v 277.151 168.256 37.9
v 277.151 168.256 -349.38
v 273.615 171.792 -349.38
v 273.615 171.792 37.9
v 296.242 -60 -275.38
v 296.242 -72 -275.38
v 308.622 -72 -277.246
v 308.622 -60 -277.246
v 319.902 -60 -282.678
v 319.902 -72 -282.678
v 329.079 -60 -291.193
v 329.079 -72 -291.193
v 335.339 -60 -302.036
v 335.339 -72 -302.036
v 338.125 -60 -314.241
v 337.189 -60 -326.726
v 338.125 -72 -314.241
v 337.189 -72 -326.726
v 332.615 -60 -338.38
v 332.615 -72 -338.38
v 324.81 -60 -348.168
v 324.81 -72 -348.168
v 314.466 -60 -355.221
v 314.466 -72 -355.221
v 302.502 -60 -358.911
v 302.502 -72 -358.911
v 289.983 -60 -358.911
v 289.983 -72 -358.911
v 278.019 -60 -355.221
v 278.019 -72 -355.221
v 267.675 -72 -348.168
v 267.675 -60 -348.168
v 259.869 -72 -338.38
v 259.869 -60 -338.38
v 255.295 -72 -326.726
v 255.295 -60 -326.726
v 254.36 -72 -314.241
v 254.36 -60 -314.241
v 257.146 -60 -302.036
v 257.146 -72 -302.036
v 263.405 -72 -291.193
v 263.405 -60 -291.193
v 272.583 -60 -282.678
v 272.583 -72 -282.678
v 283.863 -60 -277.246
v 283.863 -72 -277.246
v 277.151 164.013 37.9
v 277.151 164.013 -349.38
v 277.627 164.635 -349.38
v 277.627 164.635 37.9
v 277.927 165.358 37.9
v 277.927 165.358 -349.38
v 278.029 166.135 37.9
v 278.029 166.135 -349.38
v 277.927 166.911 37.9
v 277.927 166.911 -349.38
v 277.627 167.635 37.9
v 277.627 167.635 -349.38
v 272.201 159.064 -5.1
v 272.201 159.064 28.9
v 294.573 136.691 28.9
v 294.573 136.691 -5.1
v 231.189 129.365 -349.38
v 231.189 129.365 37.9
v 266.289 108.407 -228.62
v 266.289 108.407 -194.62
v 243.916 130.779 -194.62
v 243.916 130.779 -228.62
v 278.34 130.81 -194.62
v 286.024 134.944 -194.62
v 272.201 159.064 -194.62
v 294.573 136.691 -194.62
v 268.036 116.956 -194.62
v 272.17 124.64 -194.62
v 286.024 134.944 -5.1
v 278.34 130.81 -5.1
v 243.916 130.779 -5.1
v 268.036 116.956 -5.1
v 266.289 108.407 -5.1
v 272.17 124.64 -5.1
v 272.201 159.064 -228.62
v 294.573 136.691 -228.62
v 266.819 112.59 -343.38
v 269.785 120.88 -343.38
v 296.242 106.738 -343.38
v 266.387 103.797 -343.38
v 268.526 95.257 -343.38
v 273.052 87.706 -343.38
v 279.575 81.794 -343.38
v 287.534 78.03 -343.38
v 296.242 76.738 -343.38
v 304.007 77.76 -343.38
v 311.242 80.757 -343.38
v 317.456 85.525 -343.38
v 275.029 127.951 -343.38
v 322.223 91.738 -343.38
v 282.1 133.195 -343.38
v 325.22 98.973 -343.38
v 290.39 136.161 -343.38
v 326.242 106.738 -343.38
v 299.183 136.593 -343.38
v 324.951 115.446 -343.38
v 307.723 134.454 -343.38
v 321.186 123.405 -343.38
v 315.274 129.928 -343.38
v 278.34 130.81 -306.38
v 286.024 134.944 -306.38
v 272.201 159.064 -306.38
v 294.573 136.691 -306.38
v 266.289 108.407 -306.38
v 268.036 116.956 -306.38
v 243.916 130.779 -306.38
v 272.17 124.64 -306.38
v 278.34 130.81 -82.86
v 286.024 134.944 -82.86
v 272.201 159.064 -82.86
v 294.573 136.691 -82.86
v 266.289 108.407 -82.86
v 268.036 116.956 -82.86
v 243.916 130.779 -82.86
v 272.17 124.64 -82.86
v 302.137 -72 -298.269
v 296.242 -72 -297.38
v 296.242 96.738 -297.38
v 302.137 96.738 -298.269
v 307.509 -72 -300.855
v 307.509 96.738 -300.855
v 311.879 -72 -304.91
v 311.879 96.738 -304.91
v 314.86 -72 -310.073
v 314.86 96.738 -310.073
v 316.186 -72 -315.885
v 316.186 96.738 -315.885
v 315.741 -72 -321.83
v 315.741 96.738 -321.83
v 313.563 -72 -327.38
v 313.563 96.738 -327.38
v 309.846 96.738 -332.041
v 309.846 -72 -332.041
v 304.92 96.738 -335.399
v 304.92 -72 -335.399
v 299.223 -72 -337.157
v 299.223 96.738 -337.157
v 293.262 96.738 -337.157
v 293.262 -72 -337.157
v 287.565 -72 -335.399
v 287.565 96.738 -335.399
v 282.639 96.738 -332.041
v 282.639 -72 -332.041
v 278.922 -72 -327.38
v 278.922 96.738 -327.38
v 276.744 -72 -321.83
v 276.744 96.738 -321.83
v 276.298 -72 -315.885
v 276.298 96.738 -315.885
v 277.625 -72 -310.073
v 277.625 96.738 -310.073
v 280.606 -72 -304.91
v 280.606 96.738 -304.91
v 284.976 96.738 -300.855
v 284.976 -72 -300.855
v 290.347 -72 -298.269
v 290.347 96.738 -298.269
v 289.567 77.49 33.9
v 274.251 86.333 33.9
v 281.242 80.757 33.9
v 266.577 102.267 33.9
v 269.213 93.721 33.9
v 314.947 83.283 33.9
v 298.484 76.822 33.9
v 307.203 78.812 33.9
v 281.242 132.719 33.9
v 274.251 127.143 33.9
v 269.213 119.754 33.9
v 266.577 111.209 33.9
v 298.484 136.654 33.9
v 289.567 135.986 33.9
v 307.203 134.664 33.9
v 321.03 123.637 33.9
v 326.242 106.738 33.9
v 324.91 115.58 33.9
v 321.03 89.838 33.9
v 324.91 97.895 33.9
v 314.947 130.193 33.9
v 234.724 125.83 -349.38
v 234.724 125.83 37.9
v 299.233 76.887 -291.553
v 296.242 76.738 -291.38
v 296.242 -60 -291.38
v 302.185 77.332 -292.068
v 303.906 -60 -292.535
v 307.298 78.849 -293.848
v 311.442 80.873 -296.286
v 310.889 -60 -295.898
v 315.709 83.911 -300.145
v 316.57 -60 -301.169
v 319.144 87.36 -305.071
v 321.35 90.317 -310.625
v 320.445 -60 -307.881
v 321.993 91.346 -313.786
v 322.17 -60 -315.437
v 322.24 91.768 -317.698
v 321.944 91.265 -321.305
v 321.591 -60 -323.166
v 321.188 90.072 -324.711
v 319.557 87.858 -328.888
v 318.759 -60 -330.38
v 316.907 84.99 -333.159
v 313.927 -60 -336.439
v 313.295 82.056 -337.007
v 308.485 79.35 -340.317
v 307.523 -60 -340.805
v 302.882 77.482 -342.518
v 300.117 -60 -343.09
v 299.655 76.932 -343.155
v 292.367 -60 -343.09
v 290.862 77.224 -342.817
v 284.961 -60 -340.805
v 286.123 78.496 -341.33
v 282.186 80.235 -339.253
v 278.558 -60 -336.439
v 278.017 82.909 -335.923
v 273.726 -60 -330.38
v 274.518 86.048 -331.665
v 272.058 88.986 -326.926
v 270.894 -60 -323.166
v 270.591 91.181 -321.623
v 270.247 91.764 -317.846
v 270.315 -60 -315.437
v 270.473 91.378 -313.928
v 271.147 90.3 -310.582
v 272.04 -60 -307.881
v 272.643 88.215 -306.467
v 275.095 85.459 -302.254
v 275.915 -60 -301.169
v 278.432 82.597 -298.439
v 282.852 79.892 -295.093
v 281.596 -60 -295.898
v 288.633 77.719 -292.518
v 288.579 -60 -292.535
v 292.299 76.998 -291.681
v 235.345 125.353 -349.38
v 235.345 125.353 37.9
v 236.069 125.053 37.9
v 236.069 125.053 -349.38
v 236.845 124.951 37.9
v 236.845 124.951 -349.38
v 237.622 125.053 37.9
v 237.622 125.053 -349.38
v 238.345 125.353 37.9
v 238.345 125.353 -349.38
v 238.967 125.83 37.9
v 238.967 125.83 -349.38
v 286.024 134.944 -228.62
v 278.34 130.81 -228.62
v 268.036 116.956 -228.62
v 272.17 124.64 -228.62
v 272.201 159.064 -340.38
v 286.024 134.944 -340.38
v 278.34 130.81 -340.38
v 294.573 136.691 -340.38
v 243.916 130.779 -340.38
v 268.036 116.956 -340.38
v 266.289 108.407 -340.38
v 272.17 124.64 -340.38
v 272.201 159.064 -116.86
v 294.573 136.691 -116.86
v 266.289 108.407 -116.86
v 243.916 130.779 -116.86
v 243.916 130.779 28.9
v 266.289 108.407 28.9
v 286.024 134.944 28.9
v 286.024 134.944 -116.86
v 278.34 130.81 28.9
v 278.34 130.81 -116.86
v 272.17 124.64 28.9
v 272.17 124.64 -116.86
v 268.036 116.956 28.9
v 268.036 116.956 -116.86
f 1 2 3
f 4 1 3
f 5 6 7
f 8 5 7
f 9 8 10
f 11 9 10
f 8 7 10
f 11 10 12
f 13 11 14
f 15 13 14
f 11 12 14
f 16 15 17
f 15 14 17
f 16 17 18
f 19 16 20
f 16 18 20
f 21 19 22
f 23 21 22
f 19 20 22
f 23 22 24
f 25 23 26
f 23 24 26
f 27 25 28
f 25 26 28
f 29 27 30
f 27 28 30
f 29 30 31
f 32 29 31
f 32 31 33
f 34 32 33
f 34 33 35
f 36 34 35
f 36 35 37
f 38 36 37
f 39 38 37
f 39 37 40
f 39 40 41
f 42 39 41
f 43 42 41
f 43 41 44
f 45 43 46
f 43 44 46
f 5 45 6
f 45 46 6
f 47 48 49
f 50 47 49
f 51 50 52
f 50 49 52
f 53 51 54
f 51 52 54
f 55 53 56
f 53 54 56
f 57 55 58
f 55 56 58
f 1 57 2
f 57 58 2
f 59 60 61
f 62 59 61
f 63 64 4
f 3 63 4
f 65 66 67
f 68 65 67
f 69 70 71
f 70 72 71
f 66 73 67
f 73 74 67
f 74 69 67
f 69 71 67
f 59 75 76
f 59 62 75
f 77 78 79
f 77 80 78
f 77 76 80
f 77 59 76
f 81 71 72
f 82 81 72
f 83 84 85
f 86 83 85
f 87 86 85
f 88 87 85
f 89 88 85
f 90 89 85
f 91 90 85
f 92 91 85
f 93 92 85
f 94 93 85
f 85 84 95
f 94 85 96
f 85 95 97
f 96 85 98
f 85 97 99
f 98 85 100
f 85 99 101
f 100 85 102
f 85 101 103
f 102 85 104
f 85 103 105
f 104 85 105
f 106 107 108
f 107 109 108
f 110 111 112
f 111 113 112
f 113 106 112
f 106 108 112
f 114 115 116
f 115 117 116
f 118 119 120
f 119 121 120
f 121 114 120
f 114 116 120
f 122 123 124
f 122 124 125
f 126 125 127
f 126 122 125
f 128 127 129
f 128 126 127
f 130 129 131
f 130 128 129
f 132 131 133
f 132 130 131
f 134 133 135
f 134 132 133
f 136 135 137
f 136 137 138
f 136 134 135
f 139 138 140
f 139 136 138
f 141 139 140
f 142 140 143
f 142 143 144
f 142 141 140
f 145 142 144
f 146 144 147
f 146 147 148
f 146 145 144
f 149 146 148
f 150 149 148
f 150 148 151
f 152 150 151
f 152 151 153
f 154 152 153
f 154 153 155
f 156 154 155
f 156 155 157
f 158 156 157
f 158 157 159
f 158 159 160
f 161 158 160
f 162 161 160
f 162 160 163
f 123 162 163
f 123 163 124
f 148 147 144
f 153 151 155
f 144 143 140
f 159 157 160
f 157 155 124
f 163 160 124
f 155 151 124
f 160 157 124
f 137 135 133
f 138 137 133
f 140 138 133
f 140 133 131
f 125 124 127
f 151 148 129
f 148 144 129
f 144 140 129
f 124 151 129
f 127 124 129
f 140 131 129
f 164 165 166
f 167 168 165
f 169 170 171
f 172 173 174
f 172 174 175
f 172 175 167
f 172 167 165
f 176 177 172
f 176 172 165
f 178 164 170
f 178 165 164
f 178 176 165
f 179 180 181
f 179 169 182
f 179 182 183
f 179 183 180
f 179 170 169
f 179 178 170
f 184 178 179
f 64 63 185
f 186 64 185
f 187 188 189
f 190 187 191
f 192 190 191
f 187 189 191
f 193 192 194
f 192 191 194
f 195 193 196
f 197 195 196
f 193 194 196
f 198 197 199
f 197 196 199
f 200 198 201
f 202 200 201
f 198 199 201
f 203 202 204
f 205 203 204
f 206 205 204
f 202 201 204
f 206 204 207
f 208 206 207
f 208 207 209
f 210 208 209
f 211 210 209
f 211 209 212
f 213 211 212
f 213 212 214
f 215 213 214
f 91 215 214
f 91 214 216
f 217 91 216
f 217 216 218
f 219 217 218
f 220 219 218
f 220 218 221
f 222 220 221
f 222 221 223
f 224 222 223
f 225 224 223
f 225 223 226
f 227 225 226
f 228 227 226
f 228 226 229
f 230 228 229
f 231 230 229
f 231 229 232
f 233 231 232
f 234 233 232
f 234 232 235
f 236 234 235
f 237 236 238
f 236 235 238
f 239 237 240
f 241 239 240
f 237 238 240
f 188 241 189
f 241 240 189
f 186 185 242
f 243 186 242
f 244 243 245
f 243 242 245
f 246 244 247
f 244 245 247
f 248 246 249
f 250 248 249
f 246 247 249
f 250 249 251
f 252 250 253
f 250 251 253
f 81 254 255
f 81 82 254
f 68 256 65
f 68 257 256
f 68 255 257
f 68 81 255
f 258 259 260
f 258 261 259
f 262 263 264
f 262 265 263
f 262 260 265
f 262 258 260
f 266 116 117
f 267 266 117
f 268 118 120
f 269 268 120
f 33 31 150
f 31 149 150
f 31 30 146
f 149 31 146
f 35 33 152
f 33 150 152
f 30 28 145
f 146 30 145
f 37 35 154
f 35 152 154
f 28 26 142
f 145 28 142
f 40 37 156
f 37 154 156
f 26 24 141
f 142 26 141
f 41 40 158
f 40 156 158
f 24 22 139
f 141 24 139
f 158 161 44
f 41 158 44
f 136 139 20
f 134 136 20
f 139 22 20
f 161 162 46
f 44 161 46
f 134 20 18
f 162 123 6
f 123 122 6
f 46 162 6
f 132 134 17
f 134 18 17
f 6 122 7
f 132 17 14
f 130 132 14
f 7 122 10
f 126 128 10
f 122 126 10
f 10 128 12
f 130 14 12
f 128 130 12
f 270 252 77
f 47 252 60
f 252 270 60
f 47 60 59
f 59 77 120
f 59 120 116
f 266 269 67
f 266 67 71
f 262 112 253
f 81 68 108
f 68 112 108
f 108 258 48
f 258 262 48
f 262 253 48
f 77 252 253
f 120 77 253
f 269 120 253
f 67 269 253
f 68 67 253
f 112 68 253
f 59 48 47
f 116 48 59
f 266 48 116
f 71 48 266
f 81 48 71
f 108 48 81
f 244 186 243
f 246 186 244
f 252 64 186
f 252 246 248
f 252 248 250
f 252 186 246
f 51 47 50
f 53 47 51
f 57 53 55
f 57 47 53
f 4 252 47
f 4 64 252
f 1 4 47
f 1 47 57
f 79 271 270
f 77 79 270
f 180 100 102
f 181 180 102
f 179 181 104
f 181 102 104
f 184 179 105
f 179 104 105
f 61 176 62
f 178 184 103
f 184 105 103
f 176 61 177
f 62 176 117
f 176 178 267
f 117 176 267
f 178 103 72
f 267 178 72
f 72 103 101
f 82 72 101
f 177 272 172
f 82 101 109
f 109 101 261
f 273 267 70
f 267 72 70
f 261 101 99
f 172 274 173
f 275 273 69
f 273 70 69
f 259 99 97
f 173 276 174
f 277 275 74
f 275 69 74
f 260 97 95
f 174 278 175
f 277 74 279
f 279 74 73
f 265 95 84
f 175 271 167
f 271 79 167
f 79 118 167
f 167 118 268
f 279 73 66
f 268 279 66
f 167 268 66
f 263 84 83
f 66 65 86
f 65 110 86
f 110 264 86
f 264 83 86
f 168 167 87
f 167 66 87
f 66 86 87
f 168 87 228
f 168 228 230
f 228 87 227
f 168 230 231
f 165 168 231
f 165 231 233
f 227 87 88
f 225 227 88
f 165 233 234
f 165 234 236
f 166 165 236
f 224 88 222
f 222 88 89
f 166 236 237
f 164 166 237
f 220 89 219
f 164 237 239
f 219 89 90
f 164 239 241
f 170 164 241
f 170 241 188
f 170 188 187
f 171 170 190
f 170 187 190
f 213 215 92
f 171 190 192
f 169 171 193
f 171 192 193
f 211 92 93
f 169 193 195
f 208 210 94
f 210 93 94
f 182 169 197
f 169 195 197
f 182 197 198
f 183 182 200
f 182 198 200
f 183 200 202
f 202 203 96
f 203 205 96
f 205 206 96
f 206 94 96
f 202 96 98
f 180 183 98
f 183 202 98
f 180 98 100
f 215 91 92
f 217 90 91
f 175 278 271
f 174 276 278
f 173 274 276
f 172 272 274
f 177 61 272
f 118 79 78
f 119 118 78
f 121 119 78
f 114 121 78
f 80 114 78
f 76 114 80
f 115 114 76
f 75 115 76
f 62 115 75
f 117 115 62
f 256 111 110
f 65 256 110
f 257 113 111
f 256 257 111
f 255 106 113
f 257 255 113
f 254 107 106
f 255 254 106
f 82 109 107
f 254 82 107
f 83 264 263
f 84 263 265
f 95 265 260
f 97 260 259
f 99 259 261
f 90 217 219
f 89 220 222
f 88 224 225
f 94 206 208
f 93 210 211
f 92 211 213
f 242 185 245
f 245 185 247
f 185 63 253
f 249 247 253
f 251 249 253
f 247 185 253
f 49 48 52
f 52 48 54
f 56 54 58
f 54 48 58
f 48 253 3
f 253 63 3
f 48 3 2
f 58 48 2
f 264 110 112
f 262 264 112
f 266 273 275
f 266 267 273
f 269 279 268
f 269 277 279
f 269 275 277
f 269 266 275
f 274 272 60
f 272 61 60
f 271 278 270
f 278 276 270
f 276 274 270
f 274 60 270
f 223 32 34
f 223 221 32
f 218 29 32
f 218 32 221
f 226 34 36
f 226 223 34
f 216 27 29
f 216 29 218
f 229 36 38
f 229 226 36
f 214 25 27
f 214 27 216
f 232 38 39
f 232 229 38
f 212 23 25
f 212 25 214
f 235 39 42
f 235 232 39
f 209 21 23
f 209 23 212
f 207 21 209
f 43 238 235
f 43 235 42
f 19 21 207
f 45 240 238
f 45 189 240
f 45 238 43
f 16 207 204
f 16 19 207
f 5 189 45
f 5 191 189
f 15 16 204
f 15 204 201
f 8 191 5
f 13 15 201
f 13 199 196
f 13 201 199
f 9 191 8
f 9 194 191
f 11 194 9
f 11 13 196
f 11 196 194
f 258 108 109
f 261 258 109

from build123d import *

# Parameters (mm, degrees)
HEAD_START          = -349.38
HEAD_FLANGE_DEPTH   = 387.28
PRIMARY_START       = -5.1
PRIMARY_1_DEPTH     = 34
PRIMARY_START_2     = -116.86
PRIMARY_3_DEPTH     = 34
PRIMARY_START_3     = -228.62
PRIMARY_5_DEPTH     = 34
PRIMARY_START_4     = -340.38
PRIMARY_7_DEPTH     = 34
COLLECTOR_START     = -343.38
SKETCH6_R           = 30
COLLECTOR_DEPTH     = 377.28
OUTLET_START        = -60
SKETCH7_R           = 26
OUTLET_PIPE_DEPTH   = 166.73776862
OUTLET_START_2      = -72
SKETCH8_R           = 42
OUTLET_FLANGE_DEPTH = 12
OUTLET_START_3      = -73
SKETCH9_R           = 20
OUTLET_BORE_DEPTH   = 169.73776862


with BuildPart() as part:
    # Sketch1 → Head Flange (new body)
    with BuildSketch(Plane.XY.offset(HEAD_START)):
        with BuildLine():
            Line((231.188562109, 129.365185618), (234.724096015, 125.829651712))
            ThreePointArc((234.724096015, 125.829651712), (236.845416358, 124.950972056), (238.966736702, 125.829651712))
            Line((238.966736702, 125.829651712), (277.150502886, 164.013417896))
            ThreePointArc((277.150502886, 164.013417896), (278.029182543, 166.13473824), (277.150502886, 168.256058583))
            Line((277.150502886, 168.256058583), (273.61496898, 171.791592489))
            Line((273.61496898, 171.791592489), (231.188562109, 129.365185618))
        make_face()
    extrude(amount=HEAD_FLANGE_DEPTH)

    # Sketch2 → Primary 1 (add)
    with BuildSketch(Plane.XY.offset(PRIMARY_START)):
        Polygon((266.543901168, 164.720524677), (310.384521602, 120.879904244), (282.100250354, 92.595632996), (238.259629921, 136.43625343), align=None)
    extrude(amount=PRIMARY_1_DEPTH)

    # Sketch3 → Primary 3 (add)
    with BuildSketch(Plane.XY.offset(PRIMARY_START_2)):
        Polygon((266.543901168, 164.720524677), (310.384521602, 120.879904244), (282.100250354, 92.595632996), (238.259629921, 136.43625343), align=None)
    extrude(amount=PRIMARY_3_DEPTH)

    # Sketch4 → Primary 5 (add)
    with BuildSketch(Plane.XY.offset(PRIMARY_START_3)):
        Polygon((266.543901168, 164.720524677), (310.384521602, 120.879904244), (282.100250354, 92.595632996), (238.259629921, 136.43625343), align=None)
    extrude(amount=PRIMARY_5_DEPTH)

    # Sketch5 → Primary 7 (add)
    with BuildSketch(Plane.XY.offset(PRIMARY_START_4)):
        Polygon((266.543901168, 164.720524677), (310.384521602, 120.879904244), (282.100250354, 92.595632996), (238.259629921, 136.43625343), align=None)
    extrude(amount=PRIMARY_7_DEPTH)

    # Sketch6 → Collector (add)
    with BuildSketch(Plane.XY.offset(COLLECTOR_START)):
        with Locations((296.242385978, 106.73776862)):
            Circle(SKETCH6_R)
    extrude(amount=COLLECTOR_DEPTH)

    # Sketch7 → Outlet Pipe (add)
    with BuildSketch(Plane(origin=(0, 0, 0), x_dir=(1, 0, 0), z_dir=(0, 1, 0)).offset(OUTLET_START)):
        with Locations((296.242385978, 317.38)):
            Circle(SKETCH7_R)
    extrude(amount=OUTLET_PIPE_DEPTH)

    # Sketch8 → Outlet Flange (add)
    with BuildSketch(Plane(origin=(0, 0, 0), x_dir=(1, 0, 0), z_dir=(0, 1, 0)).offset(OUTLET_START_2)):
        with Locations((296.242385978, 317.38)):
            Circle(SKETCH8_R)
    extrude(amount=OUTLET_FLANGE_DEPTH)

    # Sketch9 → Outlet Bore (cut)
    with BuildSketch(Plane(origin=(0, 0, 0), x_dir=(1, 0, 0), z_dir=(0, 1, 0)).offset(OUTLET_START_3)):
        with Locations((296.242385978, 317.38)):
            Circle(SKETCH9_R)
    extrude(amount=OUTLET_BORE_DEPTH, mode=Mode.SUBTRACT)


solid = part.part
